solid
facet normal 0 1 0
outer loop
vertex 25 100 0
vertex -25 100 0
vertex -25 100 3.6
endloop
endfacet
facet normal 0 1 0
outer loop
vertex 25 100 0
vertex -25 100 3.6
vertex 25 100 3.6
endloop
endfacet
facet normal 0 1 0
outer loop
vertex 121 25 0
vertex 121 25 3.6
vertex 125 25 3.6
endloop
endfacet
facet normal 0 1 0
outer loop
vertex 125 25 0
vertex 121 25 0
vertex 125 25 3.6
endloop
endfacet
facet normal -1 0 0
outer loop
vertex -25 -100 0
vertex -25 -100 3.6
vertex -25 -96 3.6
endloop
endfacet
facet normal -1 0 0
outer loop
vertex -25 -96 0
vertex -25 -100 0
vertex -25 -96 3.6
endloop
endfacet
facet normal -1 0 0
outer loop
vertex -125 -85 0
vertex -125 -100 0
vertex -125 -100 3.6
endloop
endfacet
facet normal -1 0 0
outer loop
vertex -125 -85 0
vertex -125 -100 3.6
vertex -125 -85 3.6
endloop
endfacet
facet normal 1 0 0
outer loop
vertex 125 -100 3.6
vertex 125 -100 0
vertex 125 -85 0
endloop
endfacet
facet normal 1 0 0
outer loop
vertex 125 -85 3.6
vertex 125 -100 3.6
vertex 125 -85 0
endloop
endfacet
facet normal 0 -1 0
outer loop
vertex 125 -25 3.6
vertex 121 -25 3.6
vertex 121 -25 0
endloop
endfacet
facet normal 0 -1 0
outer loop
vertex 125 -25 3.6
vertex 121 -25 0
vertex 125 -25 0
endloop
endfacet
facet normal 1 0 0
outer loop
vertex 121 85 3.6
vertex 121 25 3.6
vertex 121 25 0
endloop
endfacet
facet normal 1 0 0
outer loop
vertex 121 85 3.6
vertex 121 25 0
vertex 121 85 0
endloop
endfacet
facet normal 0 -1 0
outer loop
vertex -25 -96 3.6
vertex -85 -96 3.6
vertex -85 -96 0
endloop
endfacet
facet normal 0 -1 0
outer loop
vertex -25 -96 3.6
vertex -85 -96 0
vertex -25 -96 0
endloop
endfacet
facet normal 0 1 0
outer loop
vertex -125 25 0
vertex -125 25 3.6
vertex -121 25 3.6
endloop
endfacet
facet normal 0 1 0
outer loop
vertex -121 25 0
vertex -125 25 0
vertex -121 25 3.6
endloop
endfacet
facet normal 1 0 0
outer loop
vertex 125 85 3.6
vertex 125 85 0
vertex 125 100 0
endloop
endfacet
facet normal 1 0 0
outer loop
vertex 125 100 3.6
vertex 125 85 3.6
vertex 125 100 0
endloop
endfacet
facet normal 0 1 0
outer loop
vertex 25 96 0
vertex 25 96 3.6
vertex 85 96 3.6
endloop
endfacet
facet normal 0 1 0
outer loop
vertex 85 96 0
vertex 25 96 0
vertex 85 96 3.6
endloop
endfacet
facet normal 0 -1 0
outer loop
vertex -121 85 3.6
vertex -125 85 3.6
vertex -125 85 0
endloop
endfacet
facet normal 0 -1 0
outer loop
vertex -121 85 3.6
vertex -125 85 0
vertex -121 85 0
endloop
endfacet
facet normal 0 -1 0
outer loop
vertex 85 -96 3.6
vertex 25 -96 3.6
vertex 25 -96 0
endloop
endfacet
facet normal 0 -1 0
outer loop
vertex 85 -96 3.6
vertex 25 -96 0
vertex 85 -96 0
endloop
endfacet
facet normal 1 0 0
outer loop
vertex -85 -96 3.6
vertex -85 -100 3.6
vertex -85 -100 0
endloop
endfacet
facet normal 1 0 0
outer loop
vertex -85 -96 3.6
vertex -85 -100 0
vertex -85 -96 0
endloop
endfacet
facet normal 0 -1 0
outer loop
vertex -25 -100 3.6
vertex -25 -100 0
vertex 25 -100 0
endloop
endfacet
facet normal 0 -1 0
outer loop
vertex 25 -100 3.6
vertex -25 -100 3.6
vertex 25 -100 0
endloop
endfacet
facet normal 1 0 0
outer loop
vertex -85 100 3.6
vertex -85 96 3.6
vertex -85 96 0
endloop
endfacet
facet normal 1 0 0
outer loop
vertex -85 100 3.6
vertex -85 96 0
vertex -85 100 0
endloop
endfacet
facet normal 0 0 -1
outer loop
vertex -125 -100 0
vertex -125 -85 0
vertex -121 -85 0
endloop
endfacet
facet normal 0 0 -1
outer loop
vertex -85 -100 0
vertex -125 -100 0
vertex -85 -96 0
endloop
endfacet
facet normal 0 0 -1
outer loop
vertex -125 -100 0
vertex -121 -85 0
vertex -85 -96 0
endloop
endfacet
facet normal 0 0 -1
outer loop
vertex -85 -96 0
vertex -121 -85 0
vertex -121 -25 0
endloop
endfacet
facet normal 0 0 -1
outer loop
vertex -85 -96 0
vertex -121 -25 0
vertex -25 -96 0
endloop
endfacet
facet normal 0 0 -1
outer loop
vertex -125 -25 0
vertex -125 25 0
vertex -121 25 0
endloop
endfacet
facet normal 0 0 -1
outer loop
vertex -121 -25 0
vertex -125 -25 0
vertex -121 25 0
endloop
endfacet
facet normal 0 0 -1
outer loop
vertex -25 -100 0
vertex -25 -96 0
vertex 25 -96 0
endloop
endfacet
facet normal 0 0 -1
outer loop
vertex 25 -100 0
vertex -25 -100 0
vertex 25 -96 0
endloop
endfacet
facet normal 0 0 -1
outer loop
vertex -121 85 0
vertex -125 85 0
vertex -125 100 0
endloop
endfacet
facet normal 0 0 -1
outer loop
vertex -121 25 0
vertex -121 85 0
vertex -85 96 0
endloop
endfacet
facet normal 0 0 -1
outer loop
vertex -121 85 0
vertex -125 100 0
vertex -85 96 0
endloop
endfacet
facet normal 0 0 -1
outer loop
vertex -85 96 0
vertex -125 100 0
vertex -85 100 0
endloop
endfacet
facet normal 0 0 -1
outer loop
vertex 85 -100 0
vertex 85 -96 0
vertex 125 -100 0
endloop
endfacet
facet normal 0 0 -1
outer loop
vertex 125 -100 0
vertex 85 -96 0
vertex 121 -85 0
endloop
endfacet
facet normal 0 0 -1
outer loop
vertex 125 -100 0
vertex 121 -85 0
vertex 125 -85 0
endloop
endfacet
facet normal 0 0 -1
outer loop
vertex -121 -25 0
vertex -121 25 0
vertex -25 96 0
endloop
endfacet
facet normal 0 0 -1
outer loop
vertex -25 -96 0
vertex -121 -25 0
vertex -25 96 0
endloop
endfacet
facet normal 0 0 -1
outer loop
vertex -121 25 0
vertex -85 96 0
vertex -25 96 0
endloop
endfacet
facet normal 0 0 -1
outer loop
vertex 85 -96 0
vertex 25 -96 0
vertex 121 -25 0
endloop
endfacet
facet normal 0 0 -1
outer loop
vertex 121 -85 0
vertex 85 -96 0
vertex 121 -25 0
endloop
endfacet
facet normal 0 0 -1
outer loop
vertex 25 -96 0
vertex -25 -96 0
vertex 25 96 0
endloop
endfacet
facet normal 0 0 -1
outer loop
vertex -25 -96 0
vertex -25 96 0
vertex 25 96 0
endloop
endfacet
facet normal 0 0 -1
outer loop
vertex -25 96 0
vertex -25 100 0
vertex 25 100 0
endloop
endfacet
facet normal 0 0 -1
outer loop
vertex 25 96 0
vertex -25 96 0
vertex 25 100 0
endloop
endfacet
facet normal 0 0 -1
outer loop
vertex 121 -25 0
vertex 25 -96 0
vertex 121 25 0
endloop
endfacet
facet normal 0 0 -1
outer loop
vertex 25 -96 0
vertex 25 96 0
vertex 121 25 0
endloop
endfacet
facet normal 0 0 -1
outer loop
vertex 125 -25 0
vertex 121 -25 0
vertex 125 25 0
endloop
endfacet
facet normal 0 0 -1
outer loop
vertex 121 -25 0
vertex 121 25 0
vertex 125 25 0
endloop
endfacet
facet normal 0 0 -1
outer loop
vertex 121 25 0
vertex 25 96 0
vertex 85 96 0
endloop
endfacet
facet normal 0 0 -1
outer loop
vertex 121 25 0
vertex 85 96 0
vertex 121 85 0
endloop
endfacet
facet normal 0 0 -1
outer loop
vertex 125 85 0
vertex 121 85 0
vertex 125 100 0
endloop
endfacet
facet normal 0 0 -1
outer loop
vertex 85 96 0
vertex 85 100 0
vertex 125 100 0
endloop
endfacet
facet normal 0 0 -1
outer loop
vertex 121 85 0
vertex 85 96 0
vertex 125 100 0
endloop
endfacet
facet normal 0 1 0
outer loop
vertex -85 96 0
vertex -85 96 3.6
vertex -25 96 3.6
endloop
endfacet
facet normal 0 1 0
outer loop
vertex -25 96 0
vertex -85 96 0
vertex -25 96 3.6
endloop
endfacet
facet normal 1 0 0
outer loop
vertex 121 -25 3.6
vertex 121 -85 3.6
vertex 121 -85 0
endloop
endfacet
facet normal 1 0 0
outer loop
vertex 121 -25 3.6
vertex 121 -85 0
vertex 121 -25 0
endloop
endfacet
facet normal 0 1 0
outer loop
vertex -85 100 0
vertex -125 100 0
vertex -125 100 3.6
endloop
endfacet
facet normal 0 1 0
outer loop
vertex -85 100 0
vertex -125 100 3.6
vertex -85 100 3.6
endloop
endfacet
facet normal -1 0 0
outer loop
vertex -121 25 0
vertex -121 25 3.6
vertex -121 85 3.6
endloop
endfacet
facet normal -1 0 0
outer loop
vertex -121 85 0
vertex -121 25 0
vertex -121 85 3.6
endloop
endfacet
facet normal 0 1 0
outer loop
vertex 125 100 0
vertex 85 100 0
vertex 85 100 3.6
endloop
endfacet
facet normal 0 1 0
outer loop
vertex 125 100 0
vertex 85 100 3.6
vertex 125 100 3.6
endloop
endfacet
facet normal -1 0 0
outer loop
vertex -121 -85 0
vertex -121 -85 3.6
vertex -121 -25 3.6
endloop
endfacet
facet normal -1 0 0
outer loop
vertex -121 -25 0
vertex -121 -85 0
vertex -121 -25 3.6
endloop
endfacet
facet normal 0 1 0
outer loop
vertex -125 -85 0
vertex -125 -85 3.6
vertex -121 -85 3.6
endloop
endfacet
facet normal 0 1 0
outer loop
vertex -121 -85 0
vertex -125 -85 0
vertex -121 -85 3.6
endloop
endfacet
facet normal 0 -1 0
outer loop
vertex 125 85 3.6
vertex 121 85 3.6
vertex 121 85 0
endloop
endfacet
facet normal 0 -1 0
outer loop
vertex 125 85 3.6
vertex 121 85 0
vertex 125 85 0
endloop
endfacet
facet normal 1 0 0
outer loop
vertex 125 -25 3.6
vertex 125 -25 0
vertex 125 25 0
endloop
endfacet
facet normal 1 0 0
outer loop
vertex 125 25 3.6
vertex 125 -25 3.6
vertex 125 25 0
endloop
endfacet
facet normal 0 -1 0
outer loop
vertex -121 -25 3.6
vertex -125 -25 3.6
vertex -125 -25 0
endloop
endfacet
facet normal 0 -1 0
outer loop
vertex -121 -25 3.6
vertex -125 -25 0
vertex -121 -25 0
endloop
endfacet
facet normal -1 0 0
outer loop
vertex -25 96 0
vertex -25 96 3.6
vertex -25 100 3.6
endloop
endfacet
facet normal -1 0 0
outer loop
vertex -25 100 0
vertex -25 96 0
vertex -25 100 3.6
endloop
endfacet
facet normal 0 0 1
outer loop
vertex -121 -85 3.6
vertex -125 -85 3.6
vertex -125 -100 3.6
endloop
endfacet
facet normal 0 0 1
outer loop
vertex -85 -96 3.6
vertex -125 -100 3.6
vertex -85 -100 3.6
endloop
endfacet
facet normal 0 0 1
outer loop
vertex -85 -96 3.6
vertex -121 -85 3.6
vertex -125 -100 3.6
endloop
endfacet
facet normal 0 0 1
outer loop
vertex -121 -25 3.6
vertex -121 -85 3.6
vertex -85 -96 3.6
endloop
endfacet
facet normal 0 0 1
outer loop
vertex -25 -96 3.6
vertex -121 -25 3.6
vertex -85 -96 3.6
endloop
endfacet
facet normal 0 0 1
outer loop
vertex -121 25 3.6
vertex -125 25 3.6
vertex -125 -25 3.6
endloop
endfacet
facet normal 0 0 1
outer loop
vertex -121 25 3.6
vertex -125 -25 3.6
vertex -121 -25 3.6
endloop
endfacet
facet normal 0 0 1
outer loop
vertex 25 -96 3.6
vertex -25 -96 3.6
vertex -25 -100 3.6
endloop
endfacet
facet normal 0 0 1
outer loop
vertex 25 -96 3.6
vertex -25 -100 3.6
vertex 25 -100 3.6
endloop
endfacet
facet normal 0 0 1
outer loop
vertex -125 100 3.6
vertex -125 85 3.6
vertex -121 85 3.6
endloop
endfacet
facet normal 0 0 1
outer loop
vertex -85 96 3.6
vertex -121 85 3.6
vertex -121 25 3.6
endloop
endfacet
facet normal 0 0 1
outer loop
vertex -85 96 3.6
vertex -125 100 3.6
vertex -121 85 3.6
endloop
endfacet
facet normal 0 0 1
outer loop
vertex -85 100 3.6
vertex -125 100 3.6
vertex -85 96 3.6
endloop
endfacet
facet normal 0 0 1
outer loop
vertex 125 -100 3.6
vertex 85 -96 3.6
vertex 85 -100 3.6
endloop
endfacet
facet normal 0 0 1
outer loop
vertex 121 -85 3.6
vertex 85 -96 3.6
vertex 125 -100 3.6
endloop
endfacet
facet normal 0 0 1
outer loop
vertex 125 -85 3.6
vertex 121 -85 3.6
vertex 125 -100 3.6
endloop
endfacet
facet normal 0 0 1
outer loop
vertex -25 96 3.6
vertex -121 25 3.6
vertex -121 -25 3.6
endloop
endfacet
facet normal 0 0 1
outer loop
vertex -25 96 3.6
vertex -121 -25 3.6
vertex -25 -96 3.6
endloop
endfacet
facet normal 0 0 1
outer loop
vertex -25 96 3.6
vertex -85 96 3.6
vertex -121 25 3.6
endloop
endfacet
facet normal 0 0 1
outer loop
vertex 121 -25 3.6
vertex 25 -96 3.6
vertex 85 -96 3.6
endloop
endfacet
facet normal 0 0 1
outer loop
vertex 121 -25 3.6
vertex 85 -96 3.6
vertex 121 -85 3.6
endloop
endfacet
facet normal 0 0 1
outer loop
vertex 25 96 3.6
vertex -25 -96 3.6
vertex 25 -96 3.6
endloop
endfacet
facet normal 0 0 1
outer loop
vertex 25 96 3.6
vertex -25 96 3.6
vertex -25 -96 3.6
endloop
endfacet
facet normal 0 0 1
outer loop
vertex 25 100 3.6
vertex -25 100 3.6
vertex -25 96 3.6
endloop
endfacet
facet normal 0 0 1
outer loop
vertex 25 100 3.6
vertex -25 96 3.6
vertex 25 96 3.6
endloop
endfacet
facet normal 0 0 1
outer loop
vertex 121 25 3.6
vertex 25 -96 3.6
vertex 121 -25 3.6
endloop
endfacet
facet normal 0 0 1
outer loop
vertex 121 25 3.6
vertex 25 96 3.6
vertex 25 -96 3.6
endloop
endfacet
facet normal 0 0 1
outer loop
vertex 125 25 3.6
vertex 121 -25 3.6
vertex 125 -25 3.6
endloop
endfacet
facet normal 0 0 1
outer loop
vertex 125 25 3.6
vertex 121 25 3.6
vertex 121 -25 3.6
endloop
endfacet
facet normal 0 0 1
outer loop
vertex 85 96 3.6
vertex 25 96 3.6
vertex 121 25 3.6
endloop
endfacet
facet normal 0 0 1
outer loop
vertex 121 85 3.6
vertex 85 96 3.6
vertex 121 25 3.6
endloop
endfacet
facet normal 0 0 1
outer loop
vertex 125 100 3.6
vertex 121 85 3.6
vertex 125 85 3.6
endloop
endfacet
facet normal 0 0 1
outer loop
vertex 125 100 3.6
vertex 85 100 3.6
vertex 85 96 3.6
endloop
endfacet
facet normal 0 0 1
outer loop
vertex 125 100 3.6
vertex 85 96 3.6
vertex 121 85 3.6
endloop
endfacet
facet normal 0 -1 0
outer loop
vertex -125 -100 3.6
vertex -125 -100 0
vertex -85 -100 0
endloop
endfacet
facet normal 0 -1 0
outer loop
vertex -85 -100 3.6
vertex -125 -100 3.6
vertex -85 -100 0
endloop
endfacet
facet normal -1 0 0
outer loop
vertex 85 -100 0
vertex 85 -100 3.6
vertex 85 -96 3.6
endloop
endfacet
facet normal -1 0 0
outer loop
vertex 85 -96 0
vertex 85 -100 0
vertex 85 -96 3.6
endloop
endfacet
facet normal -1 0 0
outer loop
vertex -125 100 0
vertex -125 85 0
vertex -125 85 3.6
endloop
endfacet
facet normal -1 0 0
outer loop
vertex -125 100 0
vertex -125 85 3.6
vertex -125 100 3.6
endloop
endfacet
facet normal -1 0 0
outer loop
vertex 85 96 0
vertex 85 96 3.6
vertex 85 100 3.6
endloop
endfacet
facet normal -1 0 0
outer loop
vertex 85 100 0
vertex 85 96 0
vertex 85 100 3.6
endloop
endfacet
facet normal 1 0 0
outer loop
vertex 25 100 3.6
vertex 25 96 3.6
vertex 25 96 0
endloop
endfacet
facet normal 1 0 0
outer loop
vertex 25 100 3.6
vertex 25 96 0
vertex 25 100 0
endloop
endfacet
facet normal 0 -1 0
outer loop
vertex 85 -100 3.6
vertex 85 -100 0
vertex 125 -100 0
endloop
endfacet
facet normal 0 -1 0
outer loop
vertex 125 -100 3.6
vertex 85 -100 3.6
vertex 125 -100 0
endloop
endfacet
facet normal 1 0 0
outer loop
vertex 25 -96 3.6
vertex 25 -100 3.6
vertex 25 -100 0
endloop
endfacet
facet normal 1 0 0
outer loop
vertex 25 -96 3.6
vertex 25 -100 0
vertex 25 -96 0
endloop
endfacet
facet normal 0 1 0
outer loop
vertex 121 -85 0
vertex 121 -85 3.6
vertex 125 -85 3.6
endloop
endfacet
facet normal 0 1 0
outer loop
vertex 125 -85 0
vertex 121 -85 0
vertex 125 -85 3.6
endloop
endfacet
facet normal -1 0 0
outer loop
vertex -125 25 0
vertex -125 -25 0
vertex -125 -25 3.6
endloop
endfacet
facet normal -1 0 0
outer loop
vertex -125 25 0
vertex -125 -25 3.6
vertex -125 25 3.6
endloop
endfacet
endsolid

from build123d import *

# Parameters (mm, degrees)
SKETCH_1_W          = 250
SKETCH_1_H          = 200
EXTRUDE_1_DEPTH     = 3.6
SKETCH_2_W          = 4
SKETCH_2_H          = 60
CUT_EXTRUDE_1_DEPTH = 10
SKETCH_3_W          = 60
SKETCH_3_H          = 4
CUT_EXTRUDE_2_DEPTH = 10


with BuildPart() as part:
    # 草图1 → 凸台-拉伸1 (new body)
    with BuildSketch(Plane.XY):
        Rectangle(SKETCH_1_W, SKETCH_1_H)
    extrude(amount=EXTRUDE_1_DEPTH)

    # 草图2 → 切除-拉伸1 (cut)
    with BuildSketch(Plane.XY.offset(3.6)):
        with Locations((-123, 55)):
            Rectangle(SKETCH_2_W, SKETCH_2_H)
        with Locations((123, 55)):
            Rectangle(SKETCH_2_W, SKETCH_2_H)
        with Locations((-123, -55)):
            Rectangle(SKETCH_2_W, SKETCH_2_H)
        with Locations((123, -55)):
            Rectangle(SKETCH_2_W, SKETCH_2_H)
    extrude(amount=-CUT_EXTRUDE_1_DEPTH, mode=Mode.SUBTRACT)

    # 草图3 → 切除-拉伸2 (cut)
    with BuildSketch(Plane.XY.offset(3.6)):
        with Locations((-55, -98)):
            Rectangle(SKETCH_3_W, SKETCH_3_H)
        with Locations((55, -98)):
            Rectangle(SKETCH_3_W, SKETCH_3_H)
        with Locations((55, 98)):
            Rectangle(SKETCH_3_W, SKETCH_3_H)
        with Locations((-55, 98)):
            Rectangle(SKETCH_3_W, SKETCH_3_H)
    extrude(amount=-CUT_EXTRUDE_2_DEPTH, mode=Mode.SUBTRACT)


solid = part.part
